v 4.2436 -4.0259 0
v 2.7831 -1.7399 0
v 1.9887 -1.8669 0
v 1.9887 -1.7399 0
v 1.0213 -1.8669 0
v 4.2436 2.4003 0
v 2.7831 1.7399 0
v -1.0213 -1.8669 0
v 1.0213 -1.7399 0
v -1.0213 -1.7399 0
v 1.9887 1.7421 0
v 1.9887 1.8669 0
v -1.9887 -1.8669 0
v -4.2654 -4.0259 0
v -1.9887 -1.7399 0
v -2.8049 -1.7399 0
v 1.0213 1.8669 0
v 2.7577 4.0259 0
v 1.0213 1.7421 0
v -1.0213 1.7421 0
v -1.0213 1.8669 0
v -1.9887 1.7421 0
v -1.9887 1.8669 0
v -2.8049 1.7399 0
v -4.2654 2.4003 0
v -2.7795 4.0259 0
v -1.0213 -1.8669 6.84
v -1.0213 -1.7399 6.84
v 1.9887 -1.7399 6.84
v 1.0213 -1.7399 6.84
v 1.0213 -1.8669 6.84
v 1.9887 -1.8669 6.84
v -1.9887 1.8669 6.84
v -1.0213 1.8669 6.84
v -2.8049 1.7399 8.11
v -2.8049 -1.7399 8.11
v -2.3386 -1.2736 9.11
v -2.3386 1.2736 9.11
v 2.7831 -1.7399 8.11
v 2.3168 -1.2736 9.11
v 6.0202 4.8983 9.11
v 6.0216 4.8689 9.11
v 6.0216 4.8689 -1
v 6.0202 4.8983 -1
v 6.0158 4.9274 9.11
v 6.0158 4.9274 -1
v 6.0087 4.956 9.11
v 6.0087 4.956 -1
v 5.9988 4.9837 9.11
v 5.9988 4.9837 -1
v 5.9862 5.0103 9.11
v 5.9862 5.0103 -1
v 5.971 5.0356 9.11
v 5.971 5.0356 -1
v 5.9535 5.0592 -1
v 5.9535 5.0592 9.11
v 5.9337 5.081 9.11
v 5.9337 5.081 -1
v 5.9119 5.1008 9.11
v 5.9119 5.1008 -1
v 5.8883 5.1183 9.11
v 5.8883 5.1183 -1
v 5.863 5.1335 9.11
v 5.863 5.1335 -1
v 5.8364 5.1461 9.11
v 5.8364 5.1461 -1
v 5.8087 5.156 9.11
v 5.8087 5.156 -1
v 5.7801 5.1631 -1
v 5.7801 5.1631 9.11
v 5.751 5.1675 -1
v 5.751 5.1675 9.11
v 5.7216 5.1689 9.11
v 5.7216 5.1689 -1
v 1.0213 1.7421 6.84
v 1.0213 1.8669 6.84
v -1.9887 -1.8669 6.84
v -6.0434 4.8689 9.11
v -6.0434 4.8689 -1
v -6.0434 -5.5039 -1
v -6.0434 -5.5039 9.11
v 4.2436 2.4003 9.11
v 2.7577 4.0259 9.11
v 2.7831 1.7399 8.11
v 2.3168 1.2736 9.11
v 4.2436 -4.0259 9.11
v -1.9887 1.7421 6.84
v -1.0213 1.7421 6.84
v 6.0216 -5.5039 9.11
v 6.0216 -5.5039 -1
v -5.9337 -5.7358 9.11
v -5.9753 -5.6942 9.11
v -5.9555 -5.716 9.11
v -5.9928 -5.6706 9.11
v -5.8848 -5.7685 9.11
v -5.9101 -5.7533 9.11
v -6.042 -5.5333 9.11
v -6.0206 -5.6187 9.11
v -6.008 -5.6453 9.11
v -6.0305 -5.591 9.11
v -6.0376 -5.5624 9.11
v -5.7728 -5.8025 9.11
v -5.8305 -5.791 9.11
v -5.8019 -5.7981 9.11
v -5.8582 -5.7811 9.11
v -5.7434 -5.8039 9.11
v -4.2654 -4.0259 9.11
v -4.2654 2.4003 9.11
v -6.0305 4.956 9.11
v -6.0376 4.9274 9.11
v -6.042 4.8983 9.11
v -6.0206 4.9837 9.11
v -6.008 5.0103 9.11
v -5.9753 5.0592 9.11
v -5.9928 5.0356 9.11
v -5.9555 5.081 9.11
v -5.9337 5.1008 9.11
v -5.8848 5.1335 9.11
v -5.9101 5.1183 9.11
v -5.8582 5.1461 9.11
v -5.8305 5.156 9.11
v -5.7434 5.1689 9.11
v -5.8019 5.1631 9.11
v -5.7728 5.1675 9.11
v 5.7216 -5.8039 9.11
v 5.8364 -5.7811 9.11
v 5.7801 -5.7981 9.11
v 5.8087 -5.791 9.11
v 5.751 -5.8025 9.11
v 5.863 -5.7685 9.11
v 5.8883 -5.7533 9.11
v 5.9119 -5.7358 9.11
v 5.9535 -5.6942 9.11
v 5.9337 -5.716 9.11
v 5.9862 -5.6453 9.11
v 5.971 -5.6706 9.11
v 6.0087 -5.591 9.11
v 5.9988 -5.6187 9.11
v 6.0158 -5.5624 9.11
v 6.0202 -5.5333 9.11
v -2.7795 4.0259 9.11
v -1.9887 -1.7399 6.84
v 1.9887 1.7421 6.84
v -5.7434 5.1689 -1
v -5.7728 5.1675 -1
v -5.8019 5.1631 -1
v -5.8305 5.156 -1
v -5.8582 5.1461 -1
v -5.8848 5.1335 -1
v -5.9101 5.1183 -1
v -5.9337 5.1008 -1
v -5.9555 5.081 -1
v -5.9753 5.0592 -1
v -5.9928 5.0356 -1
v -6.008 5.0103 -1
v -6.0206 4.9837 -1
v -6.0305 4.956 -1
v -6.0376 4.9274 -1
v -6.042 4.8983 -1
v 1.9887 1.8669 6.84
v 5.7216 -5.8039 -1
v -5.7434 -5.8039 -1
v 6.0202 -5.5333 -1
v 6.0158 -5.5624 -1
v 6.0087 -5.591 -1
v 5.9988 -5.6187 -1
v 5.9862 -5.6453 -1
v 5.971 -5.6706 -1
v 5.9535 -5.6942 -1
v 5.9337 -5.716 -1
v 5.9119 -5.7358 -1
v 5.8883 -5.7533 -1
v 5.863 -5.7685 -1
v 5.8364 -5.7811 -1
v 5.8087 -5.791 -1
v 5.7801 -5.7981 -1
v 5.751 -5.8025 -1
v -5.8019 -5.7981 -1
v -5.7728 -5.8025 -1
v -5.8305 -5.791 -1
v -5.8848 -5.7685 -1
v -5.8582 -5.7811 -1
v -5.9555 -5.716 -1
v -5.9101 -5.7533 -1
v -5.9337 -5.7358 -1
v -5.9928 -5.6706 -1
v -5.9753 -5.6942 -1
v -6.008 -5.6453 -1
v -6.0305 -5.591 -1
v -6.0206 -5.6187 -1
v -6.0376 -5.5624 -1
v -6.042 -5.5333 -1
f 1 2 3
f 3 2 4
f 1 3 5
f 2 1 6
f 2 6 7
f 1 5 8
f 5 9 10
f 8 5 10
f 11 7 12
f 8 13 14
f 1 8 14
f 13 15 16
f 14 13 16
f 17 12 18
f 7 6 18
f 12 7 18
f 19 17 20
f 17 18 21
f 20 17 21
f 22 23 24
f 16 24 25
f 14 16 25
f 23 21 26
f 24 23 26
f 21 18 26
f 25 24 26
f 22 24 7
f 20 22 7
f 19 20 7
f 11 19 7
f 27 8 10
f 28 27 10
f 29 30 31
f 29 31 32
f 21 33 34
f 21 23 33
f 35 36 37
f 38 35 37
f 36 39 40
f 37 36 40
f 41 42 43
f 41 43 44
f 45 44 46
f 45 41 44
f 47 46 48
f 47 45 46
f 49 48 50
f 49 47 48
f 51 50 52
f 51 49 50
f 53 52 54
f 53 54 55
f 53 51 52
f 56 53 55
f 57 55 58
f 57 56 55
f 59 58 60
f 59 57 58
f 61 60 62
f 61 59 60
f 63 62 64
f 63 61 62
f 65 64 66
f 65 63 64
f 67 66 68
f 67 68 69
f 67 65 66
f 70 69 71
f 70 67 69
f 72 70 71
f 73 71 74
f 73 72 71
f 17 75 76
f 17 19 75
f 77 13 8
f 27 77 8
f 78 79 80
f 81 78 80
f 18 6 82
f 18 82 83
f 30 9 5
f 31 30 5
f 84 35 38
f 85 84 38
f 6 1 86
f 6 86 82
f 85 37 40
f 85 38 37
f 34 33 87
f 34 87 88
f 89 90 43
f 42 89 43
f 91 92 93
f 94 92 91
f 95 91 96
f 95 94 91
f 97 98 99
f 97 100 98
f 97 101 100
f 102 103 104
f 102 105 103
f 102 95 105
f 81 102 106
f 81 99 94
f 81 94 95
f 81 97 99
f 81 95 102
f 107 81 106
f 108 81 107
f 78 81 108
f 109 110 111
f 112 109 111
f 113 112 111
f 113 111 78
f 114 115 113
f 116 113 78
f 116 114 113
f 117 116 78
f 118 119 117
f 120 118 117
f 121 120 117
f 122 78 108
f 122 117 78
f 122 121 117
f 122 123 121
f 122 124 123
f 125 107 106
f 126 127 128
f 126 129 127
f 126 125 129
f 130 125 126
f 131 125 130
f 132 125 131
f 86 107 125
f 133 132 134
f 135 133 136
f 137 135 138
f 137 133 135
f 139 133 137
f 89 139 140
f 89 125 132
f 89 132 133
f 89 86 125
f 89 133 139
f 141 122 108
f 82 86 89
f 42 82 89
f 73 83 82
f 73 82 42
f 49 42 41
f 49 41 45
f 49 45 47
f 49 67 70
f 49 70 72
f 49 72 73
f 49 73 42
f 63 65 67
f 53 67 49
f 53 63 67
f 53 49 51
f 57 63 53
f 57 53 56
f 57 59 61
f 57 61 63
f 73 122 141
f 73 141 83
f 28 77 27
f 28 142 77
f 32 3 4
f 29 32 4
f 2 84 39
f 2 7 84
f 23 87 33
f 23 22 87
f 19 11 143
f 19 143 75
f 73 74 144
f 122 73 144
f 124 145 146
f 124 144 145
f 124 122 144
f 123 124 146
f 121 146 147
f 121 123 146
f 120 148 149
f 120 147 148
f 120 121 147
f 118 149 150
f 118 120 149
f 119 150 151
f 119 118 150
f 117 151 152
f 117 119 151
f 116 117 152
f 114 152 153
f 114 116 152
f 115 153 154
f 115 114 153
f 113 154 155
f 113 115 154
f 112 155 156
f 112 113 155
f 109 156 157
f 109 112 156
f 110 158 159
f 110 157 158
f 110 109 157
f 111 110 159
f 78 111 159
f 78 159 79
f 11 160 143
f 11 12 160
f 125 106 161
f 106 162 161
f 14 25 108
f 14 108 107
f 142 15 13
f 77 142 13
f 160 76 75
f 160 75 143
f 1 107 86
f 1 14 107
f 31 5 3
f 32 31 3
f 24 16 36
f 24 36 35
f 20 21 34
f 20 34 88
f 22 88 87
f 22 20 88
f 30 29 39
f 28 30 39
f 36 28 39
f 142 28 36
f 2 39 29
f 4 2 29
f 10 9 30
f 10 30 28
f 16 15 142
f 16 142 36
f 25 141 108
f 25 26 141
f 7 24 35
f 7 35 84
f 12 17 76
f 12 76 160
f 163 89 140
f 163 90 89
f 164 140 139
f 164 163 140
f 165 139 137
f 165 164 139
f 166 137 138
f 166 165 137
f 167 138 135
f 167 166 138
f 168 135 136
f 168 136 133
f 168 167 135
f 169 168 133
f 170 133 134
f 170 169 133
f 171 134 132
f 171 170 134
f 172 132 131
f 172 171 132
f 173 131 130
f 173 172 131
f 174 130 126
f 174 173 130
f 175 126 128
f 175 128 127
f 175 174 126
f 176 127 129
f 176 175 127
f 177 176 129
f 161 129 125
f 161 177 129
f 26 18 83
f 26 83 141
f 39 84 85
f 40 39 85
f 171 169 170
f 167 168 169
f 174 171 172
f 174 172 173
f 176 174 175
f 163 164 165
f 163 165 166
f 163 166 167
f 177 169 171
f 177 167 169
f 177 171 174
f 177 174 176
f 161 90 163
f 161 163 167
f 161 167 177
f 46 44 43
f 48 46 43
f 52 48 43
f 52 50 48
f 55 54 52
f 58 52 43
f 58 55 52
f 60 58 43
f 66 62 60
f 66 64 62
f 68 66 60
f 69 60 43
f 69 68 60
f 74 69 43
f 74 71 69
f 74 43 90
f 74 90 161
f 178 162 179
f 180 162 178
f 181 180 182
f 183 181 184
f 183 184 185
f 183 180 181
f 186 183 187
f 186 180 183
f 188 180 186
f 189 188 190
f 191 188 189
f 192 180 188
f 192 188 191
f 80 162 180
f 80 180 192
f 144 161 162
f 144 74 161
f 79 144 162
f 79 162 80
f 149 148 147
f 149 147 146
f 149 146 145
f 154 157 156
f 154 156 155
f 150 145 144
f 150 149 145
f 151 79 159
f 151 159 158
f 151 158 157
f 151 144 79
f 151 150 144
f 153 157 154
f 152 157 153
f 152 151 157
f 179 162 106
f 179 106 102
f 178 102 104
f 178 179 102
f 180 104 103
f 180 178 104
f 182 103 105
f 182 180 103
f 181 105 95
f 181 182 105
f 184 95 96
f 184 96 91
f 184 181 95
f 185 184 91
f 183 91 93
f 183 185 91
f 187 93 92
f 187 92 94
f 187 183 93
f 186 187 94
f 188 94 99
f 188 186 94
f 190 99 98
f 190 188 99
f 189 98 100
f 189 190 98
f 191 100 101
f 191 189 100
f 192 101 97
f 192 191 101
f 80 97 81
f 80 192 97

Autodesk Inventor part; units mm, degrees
ref_plane "YZ Plane" through (0, 0, 0) normal (1, 0, 0) x (0, 1, 0)
ref_plane "XZ Plane" through (0, 0, 0) normal (0, 1, 0) x (-1, 0, 0)
ref_plane "XY Plane" through (0, 0, 0) normal (0, 0, 1) x (1, 0, 0)
sketch "Sketch1" plane through (0, 0, 0) normal (0, 0, 1) x (1, 0, 0)
  line L0 (-6.0434, 5.1689) -> (-6.0434, -5.8039) construction
  line L1 (-6.0434, -5.8039) -> (6.0216, -5.8039) construction
  line L2 (6.0216, -5.8039) -> (6.0216, 5.1689) construction
  line L3 (6.0216, 5.1689) -> (-6.0434, 5.1689) construction
  line L4 (-4.2654, -4.0259) -> (4.2436, -4.0259) construction
  line L5 (-4.2654, 2.4003) -> (-4.2654, -4.0259) construction
  line L6 (-2.7795, 4.0259) -> (-4.2654, 2.4003) construction
  line L7 (2.7577, 4.0259) -> (-2.7795, 4.0259) construction
  line L8 (4.2436, 2.4003) -> (2.7577, 4.0259) construction
  line L9 (4.2436, -4.0259) -> (4.2436, 2.4003) construction
  line L10 (-4.2654, -4.0259) -> (4.2436, -4.0259) construction
  line L11 (4.2436, -4.0259) -> (4.2436, 2.4003) construction
  line L12 (4.2436, 2.4003) -> (2.7577, 4.0259) construction
  line L13 (2.7577, 4.0259) -> (-2.7795, 4.0259) construction
  line L14 (-2.7795, 4.0259) -> (-4.2654, 2.4003) construction
  line L15 (-4.2654, 2.4003) -> (-4.2654, -4.0259) construction
  line L16 (1.9887, -1.7399) -> (2.7831, -1.7399) construction
  line L17 (1.9887, -1.8669) -> (1.9887, -1.7399) construction
  line L18 (1.9887, -1.8669) -> (1.0213, -1.8669) construction
  line L19 (1.0213, -1.8669) -> (1.0213, -1.7399) construction
  line L20 (-1.0213, -1.7399) -> (1.0213, -1.7399) construction
  line L21 (-1.0213, -1.8669) -> (-1.0213, -1.7399) construction
  line L22 (-1.0213, -1.8669) -> (-1.9887, -1.8669) construction
  line L23 (-1.9887, -1.8669) -> (-1.9887, -1.7399) construction
  line L24 (-2.8049, -1.7399) -> (-1.9887, -1.7399) construction
  line L25 (-2.8049, 1.7399) -> (-2.8049, -1.7399) construction
  line L26 (-1.9887, 1.7399) -> (-2.8049, 1.7399) construction
  line L27 (-1.9887, 1.8669) -> (-1.9887, 1.7399) construction
  line L28 (-1.0213, 1.8669) -> (-1.9887, 1.8669) construction
  line L29 (-1.0213, 1.8669) -> (-1.0213, 1.7399) construction
  line L30 (1.0213, 1.7399) -> (-1.0213, 1.7399) construction
  line L31 (1.0213, 1.8669) -> (1.0213, 1.7399) construction
  line L32 (1.9887, 1.8669) -> (1.0213, 1.8669) construction
  line L33 (1.9887, 1.8669) -> (1.9887, 1.7399) construction
  line L34 (2.7831, 1.7399) -> (1.9887, 1.7399) construction
  line L35 (2.7831, -1.7399) -> (2.7831, 1.7399) construction
  line L36 (2.1481, -1.1049) -> (2.1481, 1.1049) construction
  line L37 (2.1481, 1.1049) -> (-2.1699, 1.1049) construction
  line L38 (-2.1699, 1.1049) -> (-2.1699, -1.1049) construction
  line L39 (-2.1699, -1.1049) -> (2.1481, -1.1049) construction
  line L40 (-2.8049, 0) -> (2.7831, 0) construction
  line L41 (0, 1.7399) -> (0, -1.7399) construction
  point P0 (0, 0)
  point P1 (0, 0)
sketch "Sketch2" plane through (0, 0, 0) normal (0, 0, 1) x (1, 0, 0)
  line L0 (6.0216, 5.1689) -> (-6.0434, 5.1689) projected
  line L1 (-6.0434, 5.1689) -> (-6.0434, -5.8039) projected
  line L2 (-6.0434, -5.8039) -> (6.0216, -5.8039) projected
  line L3 (6.0216, -5.8039) -> (6.0216, 5.1689) projected
  line L4 (-4.2654, -4.0259) -> (4.2436, -4.0259) projected
  line L5 (4.2436, -4.0259) -> (4.2436, 2.4003) projected
  line L6 (4.2436, 2.4003) -> (2.7577, 4.0259) projected
  line L7 (2.7577, 4.0259) -> (-2.7795, 4.0259) projected
  line L8 (-2.7795, 4.0259) -> (-4.2654, 2.4003) projected
  line L9 (-4.2654, 2.4003) -> (-4.2654, -4.0259) projected
  point P0 (0, 0)
extrude "Extrusion1" add sketch "Sketch2" along normal blind 9.11
sketch "Sketch3" plane through (0, 0, 0) normal (0, 0, -1) x (-1, 0, 0)
  line L0 (-6.0216, 5.1689) -> (6.0434, 5.1689) projected
  line L1 (6.0434, 5.1689) -> (6.0434, -5.8039) projected
  line L2 (6.0434, -5.8039) -> (-6.0216, -5.8039) projected
  line L3 (-6.0216, -5.8039) -> (-6.0216, 5.1689) projected
  point P0 (0, 0)
extrude "Extrusion2" add sketch "Sketch3" along normal blind 1
sketch "Sketch4" plane through (0, 0, 0) normal (0, 0, 1) x (1, 0, 0)
  line L0 (-1.9887, 1.7399) -> (-2.8049, 1.7399) construction
  line L1 (-2.8049, 1.7399) -> (-2.8049, -1.7399) construction
  line L2 (1.9887, -1.7399) -> (2.7831, -1.7399) construction
  line L3 (2.7831, -1.7399) -> (2.7831, 1.7399) construction
  line L4 (-2.8049, 1.7399) -> (2.7831, 1.7399)
  line L5 (2.7831, 1.7399) -> (2.7831, -1.7399)
  line L6 (2.7831, -1.7399) -> (-2.8049, -1.7399)
  line L7 (-2.8049, -1.7399) -> (-2.8049, 1.7399)
  point P0 (0, 0)
extrude "Extrusion3" add sketch "Sketch4" along normal blind 8.11
sketch "Sketch5" plane through (0, 0, 8.11) normal (0, 0, 1) x (1, 0, 0)
  line L0 (2.7831, 1.7399) -> (-2.8049, 1.7399) projected
  line L1 (-2.8049, 1.7399) -> (-2.8049, -1.7399) projected
  line L2 (-2.8049, -1.7399) -> (2.7831, -1.7399) projected
  line L3 (2.7831, -1.7399) -> (2.7831, 1.7399) projected
  point P0 (0, 0)
extrude "Extrusion4" add sketch "Sketch5" along normal blind 1 draft -25
sketch "Sketch6" plane through (0, 0, 0) normal (0, 0, 1) x (1, 0, 0)
  line L0 (-1.0213, 1.8669) -> (-1.9887, 1.8669) construction
  line L1 (1.9887, 1.8669) -> (1.0213, 1.8669) construction
  line L2 (1.9887, -1.8669) -> (1.0213, -1.8669) construction
  line L3 (-1.0213, -1.8669) -> (-1.9887, -1.8669) construction
  line L4 (-1.9887, 1.8669) -> (-1.0213, 1.8669)
  line L5 (-1.0213, 1.8669) -> (-1.0213, 1.7421)
  line L6 (-1.0213, 1.7421) -> (-1.9887, 1.7421)
  line L7 (-1.9887, 1.7421) -> (-1.9887, 1.8669)
  line L8 (1.0213, 1.8669) -> (1.9887, 1.8669)
  line L9 (1.9887, 1.8669) -> (1.9887, 1.7421)
  line L10 (1.9887, 1.7421) -> (1.0213, 1.7421)
  line L11 (1.0213, 1.7421) -> (1.0213, 1.8669)
  line L12 (-1.9887, -1.8669) -> (-1.0213, -1.8669)
  line L13 (-1.0213, -1.8669) -> (-1.0213, -1.7274)
  line L14 (-1.0213, -1.7274) -> (-1.9887, -1.7274)
  line L15 (-1.9887, -1.7274) -> (-1.9887, -1.8669)
  line L16 (1.0213, -1.8669) -> (1.9887, -1.8669)
  line L17 (1.9887, -1.8669) -> (1.9887, -1.7274)
  line L18 (1.9887, -1.7274) -> (1.0213, -1.7274)
  line L19 (1.0213, -1.7274) -> (1.0213, -1.8669)
  point P0 (0, 0)
extrude "Extrusion5" add sketch "Sketch6" along normal blind 6.84
fillet "Fillet1" radius 0.3 4 edges at (6.0216, 5.1689, 4.055) (6.0216, -5.8039, 4.055) (-6.0434, -5.8039, 4.055) (-6.0434, 5.1689, 4.055)
properties part number "USB B Female Port" material "Steel, Mild"
